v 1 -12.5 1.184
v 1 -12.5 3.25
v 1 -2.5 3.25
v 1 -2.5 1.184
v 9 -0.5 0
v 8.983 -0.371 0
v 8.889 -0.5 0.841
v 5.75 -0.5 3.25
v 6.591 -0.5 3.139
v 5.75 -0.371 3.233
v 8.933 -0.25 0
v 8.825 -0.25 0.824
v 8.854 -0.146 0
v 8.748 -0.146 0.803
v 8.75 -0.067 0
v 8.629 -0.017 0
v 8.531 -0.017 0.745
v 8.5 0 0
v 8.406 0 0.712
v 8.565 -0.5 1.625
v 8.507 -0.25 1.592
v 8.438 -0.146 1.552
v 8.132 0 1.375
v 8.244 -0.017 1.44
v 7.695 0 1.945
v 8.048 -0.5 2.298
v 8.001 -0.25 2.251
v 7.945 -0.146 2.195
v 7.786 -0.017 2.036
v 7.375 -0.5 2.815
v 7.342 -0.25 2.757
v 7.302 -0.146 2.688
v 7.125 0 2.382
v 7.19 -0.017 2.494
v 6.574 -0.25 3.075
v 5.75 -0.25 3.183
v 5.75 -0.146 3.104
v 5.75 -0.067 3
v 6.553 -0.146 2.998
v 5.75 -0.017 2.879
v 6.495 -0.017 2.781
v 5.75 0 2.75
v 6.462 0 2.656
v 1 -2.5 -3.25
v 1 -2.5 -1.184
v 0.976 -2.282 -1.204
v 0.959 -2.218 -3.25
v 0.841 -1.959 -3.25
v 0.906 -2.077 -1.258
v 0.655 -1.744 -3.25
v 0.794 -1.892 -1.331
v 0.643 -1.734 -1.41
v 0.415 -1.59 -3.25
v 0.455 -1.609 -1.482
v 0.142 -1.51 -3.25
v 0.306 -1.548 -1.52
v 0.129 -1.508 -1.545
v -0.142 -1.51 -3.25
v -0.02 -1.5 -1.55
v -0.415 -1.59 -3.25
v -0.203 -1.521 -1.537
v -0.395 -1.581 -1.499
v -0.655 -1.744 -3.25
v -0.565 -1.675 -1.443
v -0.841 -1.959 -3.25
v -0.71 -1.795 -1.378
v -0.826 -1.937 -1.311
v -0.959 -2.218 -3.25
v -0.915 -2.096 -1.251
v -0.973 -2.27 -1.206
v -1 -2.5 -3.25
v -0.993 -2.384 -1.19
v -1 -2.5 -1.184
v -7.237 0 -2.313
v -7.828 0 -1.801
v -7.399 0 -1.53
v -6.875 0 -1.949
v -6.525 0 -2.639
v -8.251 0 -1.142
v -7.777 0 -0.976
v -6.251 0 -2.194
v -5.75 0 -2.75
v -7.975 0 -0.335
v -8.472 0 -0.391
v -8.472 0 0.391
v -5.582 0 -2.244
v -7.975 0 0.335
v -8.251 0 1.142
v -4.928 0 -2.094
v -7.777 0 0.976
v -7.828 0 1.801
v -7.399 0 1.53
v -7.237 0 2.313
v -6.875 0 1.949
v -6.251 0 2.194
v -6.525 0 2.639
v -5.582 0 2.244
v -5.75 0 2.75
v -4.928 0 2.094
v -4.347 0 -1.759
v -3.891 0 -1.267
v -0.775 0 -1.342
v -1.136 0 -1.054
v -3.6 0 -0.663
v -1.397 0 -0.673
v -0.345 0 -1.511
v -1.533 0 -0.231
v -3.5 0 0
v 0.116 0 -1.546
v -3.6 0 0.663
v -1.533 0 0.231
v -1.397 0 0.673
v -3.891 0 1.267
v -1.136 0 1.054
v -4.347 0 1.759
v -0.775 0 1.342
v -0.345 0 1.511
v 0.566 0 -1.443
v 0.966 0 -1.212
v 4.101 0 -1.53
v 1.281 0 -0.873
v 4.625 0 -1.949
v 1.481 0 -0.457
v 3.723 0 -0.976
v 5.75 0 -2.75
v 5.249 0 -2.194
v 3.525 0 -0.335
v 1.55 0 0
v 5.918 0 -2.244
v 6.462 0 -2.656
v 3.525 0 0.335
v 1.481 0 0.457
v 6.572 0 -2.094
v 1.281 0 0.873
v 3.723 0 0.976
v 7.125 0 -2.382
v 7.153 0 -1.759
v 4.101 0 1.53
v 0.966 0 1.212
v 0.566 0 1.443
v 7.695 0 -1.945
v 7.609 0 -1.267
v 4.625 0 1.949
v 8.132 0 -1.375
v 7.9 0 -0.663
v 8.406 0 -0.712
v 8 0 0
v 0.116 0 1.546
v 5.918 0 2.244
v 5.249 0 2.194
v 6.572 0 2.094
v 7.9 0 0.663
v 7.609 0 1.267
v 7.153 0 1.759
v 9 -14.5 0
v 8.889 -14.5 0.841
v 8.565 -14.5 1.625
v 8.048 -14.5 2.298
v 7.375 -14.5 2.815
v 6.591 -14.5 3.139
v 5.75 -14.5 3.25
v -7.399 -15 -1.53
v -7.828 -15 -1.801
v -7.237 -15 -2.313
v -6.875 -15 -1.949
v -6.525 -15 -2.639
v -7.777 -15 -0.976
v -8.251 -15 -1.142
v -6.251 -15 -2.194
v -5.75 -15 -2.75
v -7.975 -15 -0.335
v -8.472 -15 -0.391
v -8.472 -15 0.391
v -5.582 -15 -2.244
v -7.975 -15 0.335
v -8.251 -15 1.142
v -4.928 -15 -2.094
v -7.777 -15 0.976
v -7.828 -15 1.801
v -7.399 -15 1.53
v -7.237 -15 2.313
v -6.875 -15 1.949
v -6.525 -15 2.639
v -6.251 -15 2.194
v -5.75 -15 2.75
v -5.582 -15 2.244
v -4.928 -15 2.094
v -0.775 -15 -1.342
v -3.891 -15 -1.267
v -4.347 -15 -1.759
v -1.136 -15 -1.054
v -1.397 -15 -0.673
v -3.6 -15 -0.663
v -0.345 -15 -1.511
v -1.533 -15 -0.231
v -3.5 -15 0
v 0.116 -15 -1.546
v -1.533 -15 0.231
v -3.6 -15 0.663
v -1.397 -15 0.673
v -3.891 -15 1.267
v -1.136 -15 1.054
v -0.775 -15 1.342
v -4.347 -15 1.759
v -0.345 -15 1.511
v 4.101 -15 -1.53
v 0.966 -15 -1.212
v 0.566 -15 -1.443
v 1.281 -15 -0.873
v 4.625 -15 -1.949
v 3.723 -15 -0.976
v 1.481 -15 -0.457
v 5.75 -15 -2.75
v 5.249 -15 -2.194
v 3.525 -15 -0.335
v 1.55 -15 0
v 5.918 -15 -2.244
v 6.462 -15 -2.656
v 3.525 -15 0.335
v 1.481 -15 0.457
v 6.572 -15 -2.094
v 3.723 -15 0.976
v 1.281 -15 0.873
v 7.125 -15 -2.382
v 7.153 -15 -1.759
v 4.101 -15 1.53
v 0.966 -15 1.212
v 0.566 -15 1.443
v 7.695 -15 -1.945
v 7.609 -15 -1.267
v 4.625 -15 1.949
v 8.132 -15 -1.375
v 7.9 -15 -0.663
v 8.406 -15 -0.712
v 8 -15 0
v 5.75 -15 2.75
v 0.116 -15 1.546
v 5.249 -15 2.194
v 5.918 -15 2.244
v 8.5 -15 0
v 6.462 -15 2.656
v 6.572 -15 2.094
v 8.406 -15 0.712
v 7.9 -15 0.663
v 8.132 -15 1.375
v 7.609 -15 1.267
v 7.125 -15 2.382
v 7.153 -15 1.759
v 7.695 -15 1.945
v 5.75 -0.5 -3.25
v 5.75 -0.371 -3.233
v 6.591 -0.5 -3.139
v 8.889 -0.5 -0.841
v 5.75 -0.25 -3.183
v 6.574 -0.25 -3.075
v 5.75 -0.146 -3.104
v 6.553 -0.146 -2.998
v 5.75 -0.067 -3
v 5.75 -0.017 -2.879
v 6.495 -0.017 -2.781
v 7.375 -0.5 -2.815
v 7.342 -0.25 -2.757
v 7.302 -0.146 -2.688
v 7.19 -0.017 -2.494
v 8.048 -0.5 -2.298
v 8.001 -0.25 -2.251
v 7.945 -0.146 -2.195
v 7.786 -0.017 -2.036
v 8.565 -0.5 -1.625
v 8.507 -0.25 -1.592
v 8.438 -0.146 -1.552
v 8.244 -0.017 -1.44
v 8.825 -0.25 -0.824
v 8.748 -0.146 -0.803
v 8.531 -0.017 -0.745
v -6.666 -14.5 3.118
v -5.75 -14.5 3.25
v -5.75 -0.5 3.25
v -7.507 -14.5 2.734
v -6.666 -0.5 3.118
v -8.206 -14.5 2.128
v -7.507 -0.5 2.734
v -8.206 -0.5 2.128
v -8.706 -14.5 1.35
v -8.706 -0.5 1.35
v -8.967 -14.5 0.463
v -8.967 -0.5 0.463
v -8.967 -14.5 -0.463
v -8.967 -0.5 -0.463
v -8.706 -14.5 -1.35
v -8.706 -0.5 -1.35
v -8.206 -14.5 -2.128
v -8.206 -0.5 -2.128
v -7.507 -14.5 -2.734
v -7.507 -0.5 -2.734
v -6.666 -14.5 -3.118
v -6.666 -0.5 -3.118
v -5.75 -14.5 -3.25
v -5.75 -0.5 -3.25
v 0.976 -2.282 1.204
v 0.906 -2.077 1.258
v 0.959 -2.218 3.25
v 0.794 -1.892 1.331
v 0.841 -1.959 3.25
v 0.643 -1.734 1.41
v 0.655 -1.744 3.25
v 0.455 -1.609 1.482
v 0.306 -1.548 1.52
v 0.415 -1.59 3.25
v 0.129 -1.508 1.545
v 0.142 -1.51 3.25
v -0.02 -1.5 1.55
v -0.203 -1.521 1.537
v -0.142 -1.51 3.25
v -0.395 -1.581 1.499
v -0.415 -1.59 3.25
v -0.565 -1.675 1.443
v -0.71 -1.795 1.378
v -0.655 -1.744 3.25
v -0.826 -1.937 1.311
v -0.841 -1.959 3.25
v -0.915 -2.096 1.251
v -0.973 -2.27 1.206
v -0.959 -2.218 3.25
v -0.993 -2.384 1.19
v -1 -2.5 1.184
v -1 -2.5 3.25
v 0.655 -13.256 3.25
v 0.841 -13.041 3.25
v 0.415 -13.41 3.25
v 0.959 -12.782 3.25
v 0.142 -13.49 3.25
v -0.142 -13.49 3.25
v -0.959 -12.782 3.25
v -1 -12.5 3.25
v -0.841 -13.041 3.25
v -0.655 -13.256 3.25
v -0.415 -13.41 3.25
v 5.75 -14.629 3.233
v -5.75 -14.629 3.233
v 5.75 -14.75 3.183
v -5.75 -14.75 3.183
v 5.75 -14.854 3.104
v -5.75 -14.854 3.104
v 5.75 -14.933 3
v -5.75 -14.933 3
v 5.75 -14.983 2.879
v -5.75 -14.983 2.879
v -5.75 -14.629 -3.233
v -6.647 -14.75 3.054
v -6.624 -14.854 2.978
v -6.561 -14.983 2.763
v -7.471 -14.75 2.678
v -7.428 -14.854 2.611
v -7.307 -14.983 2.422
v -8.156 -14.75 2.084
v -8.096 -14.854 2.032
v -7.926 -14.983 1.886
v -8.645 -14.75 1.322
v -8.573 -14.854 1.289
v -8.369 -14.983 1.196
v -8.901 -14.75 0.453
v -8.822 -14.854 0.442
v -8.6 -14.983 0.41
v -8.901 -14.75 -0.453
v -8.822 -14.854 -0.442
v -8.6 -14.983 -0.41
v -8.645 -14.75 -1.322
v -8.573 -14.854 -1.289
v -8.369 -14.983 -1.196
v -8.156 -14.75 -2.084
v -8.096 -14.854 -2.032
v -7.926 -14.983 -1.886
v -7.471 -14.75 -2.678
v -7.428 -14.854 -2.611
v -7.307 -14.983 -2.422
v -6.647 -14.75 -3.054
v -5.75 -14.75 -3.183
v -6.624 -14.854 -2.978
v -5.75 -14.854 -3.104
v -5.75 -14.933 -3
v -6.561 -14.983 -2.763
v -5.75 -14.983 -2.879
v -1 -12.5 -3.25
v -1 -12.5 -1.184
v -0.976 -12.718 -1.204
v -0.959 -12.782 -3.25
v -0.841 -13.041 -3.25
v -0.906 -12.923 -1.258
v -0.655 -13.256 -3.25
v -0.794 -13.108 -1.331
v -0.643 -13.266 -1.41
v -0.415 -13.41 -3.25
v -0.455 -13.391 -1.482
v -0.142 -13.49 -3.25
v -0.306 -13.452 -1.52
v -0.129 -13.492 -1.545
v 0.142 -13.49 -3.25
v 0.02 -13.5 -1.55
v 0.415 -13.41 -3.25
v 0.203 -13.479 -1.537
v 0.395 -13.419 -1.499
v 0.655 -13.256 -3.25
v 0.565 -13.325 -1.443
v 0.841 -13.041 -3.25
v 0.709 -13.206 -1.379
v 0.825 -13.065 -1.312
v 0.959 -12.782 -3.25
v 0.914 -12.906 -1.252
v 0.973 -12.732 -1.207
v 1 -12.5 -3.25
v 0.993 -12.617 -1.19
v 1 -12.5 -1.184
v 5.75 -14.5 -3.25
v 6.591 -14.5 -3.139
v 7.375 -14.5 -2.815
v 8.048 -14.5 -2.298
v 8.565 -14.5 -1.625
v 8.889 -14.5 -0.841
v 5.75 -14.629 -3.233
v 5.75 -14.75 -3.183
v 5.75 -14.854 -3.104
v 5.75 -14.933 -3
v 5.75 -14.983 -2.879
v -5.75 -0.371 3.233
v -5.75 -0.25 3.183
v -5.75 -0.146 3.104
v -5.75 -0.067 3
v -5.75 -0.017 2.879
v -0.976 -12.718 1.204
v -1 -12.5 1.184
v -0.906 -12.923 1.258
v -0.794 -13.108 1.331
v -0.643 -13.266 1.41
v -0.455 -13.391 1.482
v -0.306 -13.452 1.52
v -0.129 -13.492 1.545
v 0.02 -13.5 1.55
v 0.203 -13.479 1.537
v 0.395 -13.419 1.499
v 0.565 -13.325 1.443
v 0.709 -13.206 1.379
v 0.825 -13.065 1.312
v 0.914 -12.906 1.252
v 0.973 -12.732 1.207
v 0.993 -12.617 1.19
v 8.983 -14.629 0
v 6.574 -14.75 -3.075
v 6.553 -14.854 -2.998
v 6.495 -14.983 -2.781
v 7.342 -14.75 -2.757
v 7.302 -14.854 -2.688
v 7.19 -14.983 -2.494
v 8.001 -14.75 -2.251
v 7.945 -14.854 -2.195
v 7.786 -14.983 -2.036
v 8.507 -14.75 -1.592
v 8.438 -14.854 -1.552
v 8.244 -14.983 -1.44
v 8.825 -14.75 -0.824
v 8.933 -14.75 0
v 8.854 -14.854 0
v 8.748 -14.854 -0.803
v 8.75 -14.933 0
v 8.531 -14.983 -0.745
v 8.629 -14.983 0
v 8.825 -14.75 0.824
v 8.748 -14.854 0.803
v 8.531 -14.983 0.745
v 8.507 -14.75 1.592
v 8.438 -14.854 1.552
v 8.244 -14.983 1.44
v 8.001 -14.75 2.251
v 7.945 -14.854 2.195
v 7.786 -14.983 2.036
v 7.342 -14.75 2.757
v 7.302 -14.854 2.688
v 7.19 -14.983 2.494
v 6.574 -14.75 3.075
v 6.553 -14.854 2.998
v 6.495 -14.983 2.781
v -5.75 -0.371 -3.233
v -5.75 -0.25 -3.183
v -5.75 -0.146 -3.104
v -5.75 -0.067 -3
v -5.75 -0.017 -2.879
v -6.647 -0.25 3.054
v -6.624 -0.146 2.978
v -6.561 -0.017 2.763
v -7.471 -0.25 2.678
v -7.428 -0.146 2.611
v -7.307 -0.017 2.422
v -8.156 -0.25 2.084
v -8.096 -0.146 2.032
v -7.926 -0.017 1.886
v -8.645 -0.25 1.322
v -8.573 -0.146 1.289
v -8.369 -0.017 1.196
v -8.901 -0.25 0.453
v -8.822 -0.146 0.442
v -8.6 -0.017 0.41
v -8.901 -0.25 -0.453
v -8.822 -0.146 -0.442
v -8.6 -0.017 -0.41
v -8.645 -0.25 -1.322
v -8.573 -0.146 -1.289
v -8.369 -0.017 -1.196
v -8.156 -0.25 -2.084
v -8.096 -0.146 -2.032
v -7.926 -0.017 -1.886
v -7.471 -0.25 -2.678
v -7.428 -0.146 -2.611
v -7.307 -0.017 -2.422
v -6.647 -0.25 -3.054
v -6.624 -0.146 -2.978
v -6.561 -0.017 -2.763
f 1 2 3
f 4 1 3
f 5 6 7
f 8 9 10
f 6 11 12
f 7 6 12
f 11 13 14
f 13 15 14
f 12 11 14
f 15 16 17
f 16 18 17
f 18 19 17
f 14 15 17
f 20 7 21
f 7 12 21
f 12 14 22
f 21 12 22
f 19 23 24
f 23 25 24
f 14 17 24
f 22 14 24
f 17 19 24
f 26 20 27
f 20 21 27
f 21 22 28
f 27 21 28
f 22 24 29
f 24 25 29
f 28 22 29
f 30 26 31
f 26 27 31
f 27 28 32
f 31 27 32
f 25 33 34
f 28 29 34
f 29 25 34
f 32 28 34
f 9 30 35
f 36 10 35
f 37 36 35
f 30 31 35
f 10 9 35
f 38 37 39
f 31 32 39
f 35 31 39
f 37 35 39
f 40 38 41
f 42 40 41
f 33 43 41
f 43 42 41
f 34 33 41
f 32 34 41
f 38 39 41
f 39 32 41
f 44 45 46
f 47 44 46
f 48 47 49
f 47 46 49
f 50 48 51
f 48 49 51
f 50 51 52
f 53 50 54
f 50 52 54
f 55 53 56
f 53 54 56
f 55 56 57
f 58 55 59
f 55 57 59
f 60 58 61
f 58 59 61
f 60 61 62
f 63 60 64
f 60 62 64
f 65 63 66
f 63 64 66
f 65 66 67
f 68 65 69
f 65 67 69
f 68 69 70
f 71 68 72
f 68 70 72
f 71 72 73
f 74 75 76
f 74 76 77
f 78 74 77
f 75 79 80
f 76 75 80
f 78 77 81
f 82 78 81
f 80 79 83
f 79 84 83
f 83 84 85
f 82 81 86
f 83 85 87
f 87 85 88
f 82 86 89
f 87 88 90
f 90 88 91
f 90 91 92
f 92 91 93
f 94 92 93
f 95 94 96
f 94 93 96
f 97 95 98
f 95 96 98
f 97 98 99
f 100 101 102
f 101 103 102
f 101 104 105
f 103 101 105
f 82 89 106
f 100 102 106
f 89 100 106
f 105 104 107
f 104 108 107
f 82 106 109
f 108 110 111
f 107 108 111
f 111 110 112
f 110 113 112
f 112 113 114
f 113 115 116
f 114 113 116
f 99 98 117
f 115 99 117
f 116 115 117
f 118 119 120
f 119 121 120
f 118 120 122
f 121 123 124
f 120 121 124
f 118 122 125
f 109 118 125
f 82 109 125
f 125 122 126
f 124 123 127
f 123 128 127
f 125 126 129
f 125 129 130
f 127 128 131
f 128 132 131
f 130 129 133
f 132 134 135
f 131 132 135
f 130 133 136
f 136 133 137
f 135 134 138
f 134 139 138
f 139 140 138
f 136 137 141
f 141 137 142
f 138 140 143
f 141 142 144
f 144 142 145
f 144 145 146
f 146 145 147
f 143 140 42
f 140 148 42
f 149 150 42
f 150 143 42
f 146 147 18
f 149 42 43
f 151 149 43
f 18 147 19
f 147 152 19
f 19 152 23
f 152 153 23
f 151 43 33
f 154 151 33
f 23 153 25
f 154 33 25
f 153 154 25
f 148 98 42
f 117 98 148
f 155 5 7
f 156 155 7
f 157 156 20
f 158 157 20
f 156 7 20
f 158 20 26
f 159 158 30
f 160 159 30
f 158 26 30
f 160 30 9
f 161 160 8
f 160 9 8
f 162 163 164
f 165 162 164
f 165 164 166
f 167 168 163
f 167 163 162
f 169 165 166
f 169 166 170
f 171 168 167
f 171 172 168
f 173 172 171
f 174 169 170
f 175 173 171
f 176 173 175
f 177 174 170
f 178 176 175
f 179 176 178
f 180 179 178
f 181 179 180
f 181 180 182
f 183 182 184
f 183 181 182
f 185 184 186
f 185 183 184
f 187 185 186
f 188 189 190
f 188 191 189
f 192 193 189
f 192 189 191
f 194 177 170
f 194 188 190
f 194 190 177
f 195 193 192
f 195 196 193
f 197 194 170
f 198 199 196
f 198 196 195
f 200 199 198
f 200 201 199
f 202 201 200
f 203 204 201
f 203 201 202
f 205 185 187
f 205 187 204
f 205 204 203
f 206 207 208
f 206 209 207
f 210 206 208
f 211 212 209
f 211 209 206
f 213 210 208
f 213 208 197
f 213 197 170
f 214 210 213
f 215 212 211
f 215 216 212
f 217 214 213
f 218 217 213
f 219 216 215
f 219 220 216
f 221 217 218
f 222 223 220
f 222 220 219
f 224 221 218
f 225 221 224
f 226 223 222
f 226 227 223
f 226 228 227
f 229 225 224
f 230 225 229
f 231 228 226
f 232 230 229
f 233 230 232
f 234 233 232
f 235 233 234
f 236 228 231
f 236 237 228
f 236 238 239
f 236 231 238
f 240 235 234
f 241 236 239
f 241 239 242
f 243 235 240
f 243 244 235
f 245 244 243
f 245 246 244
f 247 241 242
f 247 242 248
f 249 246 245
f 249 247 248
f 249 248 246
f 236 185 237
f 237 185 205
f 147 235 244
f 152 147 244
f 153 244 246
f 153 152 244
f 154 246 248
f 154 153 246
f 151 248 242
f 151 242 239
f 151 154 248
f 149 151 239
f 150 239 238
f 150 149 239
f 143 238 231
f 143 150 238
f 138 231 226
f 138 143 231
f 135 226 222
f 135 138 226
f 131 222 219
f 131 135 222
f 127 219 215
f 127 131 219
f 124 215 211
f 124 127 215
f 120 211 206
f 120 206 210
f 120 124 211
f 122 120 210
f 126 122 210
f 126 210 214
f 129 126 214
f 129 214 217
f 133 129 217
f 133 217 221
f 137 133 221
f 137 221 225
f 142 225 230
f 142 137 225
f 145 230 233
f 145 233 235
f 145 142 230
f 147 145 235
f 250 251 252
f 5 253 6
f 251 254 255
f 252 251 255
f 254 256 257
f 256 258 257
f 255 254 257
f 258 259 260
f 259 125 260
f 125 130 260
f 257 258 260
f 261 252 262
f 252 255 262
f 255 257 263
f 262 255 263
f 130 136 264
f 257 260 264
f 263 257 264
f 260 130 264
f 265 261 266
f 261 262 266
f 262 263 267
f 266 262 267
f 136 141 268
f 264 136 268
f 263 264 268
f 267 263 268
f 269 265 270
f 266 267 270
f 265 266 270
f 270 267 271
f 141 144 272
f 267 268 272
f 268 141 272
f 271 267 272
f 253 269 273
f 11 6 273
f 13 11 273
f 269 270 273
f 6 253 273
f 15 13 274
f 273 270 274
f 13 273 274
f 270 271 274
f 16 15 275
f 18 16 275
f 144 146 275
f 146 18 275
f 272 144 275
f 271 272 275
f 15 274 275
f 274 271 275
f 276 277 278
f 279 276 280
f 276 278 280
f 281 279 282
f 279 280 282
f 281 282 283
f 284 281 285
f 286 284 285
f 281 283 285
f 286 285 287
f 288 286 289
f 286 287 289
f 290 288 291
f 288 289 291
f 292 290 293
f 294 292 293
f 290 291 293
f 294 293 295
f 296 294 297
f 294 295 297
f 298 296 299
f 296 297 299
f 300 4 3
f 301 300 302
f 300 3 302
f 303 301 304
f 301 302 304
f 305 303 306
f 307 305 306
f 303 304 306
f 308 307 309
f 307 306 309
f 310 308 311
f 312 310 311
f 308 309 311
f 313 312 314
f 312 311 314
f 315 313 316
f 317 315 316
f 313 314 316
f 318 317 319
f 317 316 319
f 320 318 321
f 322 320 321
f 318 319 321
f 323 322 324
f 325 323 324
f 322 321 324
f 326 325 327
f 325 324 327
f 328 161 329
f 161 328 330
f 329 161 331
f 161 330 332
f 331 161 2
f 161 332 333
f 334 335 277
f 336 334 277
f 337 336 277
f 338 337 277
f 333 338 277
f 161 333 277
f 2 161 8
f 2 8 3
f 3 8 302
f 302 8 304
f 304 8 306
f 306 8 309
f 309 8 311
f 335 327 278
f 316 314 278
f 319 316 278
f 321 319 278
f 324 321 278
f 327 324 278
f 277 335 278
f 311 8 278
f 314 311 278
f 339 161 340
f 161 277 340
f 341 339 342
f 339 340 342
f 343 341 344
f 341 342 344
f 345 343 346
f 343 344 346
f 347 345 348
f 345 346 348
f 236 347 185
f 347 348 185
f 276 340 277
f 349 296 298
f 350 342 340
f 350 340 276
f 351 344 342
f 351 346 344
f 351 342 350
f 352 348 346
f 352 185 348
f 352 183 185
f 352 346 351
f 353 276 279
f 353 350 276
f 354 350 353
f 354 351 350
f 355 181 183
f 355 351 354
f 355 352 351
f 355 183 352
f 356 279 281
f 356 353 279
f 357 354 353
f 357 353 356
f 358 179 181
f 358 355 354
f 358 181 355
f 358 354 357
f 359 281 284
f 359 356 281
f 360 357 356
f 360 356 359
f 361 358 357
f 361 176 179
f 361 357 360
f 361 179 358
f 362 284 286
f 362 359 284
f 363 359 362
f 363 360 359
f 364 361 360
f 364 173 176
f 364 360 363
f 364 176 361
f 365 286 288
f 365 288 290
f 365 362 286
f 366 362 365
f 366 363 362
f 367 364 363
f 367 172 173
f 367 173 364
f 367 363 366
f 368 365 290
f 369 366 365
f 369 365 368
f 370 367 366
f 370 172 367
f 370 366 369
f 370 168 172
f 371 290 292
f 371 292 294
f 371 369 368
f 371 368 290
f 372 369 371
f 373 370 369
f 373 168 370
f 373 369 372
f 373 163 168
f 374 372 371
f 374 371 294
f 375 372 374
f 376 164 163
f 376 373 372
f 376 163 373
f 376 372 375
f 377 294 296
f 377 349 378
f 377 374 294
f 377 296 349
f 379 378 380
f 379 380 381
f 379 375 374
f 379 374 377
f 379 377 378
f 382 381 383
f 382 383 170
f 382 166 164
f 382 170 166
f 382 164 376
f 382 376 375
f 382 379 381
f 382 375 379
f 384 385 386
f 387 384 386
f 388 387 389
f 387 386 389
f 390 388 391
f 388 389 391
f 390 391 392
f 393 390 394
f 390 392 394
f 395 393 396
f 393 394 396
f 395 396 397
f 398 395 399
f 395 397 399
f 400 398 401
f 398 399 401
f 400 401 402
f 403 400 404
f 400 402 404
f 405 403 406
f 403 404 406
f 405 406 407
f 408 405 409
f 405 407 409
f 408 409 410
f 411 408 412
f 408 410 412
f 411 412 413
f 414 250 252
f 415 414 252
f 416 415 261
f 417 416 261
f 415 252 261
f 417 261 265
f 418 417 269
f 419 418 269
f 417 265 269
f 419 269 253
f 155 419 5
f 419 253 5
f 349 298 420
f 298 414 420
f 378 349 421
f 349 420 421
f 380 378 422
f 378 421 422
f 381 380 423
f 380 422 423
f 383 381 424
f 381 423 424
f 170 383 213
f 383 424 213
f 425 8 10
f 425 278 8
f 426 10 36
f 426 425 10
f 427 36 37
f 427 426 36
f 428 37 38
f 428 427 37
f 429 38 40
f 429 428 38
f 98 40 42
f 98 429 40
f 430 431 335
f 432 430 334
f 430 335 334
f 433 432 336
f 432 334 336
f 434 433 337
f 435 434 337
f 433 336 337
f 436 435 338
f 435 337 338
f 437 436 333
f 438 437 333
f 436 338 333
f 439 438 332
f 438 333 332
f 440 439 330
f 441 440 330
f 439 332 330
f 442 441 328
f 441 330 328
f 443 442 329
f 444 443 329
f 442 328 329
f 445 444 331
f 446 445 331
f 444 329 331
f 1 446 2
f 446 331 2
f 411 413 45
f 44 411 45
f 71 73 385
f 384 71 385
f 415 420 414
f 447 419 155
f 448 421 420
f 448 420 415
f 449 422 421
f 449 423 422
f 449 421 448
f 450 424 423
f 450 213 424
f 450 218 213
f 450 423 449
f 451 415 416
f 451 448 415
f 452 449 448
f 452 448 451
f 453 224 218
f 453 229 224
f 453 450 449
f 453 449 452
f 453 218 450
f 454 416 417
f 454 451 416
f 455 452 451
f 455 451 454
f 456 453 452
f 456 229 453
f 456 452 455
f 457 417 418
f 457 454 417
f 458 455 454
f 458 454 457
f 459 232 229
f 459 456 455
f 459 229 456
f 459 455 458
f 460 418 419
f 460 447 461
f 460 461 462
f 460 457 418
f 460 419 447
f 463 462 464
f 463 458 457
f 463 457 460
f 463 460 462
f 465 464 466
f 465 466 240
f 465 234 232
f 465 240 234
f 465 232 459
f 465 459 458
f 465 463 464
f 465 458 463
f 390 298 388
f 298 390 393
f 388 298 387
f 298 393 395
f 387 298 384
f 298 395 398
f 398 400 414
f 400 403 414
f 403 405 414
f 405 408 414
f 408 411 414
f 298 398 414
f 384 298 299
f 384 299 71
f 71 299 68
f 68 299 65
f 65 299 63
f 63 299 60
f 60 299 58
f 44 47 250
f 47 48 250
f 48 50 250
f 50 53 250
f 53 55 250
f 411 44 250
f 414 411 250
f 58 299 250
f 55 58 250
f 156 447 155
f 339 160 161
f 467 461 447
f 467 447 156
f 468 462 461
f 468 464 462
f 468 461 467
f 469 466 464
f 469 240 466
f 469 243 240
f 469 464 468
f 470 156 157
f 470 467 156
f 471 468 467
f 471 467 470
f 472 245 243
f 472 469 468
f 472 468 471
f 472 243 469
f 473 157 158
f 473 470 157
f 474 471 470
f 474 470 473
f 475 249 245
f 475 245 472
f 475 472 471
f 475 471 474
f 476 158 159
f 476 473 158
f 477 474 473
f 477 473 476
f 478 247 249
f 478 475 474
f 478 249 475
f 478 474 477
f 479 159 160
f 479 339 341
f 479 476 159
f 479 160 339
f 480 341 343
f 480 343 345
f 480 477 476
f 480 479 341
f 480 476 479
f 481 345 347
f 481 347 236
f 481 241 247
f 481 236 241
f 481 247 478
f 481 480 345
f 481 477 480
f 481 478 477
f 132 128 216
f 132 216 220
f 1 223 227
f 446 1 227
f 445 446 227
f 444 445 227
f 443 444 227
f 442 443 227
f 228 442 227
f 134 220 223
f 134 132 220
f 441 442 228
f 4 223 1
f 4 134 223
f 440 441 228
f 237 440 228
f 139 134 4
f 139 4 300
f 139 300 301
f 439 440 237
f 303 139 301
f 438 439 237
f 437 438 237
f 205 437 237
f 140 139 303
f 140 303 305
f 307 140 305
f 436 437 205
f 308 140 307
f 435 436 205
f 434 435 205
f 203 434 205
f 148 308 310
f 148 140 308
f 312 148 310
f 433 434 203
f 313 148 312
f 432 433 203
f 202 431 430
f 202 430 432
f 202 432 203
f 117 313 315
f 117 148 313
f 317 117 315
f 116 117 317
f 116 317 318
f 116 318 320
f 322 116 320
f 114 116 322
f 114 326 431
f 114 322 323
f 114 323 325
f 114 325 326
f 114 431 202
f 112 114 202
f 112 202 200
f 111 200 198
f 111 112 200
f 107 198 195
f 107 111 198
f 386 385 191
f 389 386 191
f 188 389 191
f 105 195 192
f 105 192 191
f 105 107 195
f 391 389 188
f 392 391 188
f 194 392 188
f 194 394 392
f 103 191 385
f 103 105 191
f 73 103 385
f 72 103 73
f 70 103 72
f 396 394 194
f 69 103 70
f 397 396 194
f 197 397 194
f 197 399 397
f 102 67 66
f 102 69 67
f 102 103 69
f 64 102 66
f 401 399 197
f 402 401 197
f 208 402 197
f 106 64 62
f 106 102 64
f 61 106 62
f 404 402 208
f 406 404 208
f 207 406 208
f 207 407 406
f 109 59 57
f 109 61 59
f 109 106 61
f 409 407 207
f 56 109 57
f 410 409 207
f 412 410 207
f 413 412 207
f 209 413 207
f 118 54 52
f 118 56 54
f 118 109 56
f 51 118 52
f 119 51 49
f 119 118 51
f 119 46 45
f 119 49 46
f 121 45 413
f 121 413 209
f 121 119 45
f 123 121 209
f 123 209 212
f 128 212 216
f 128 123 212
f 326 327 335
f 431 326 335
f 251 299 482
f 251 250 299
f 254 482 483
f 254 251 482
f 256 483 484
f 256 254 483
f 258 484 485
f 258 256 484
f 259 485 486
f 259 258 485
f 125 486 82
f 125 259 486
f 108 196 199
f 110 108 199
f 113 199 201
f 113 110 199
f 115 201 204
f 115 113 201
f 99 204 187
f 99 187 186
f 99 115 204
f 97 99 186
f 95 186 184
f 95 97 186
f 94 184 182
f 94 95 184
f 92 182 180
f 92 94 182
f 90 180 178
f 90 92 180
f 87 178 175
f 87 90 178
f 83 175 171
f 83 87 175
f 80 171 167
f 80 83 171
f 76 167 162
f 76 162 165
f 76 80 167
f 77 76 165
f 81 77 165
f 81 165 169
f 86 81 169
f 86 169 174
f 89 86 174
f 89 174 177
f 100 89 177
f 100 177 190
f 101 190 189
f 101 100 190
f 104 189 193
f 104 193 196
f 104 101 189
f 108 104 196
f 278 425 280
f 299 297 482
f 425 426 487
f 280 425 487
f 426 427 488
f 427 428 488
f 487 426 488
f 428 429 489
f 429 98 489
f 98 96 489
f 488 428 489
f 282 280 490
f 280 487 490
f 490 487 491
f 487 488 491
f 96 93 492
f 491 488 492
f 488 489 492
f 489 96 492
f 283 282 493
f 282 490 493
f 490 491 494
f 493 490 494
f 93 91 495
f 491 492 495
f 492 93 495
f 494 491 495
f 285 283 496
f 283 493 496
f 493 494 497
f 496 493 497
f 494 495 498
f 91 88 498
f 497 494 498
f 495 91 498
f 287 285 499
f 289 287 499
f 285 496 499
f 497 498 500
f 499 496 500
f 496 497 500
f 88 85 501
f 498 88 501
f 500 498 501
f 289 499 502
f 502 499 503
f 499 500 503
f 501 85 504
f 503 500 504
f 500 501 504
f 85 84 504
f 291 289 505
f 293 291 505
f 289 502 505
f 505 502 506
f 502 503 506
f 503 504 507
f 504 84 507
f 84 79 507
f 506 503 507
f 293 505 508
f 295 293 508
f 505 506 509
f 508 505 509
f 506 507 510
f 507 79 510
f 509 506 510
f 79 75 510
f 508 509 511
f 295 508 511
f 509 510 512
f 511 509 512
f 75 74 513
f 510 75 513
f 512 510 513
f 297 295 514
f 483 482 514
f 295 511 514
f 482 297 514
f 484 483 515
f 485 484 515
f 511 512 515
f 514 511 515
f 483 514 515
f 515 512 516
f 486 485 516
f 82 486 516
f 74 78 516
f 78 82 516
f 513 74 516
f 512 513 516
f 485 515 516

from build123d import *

# Parameters (mm, degrees)
F0_R     = 2.25
F0_R_2   = 1.55
F1_DEPTH = 15
F3_DEPTH = 6.501
F4_R     = 0.5


with BuildPart() as f1:
    # F0 (on Front) → F1 (new body)
    with BuildSketch(Plane.XZ):
        with BuildLine():
            ThreePointArc((-5.75, -3.25), (-3.451903, -2.298097), (-2.5, 0))
            ThreePointArc((-2.5, 0), (-3.451903, 2.298097), (-5.75, 3.25))
            ThreePointArc((-5.75, 3.25), (-9, 0), (-5.75, -3.25))
        make_face()
        with Locations((-5.75, 0)):
            Circle(F0_R, mode=Mode.SUBTRACT)
        with BuildLine():
            ThreePointArc((9, 0), (8.048097, 2.298097), (5.75, 3.25))
            ThreePointArc((5.75, 3.25), (2.5, 0), (5.75, -3.25))
            ThreePointArc((5.75, -3.25), (8.048097, -2.298097), (9, 0))
        make_face()
        with Locations((5.75, 0)):
            Circle(F0_R, mode=Mode.SUBTRACT)
        with BuildLine():
            ThreePointArc((-5.75, 3.25), (-3.451903, 2.298097), (-2.5, 0))
            ThreePointArc((-2.5, 0), (-3.451903, -2.298097), (-5.75, -3.25))
            Line((-5.75, -3.25), (5.75, -3.25))
            ThreePointArc((5.75, -3.25), (2.5, 0), (5.75, 3.25))
            Line((5.75, 3.25), (-5.75, 3.25))
        make_face()
        Circle(F0_R_2, mode=Mode.SUBTRACT)
    extrude(amount=F1_DEPTH)

    # F2 (on face) → F3 (cut, through all)
    with BuildSketch(Plane.XY.offset(3.25)):
        with BuildLine():
            ThreePointArc((-1, -12.5), (0, -13.5), (1, -12.5))
            ThreePointArc((1, -12.5), (0, -11.5), (-1, -12.5))
        make_face()
        with BuildLine():
            ThreePointArc((-1, -12.5), (0, -11.5), (1, -12.5))
            Line((1, -12.5), (1, -7.5))
            Line((1, -7.5), (1, -2.5))
            ThreePointArc((1, -2.5), (0, -3.5), (-1, -2.5))
            Line((-1, -2.5), (-1, -7.5))
            Line((-1, -7.5), (-1, -12.5))
        make_face()
        with BuildLine():
            ThreePointArc((-1, -2.5), (0, -3.5), (1, -2.5))
            ThreePointArc((1, -2.5), (0, -1.5), (-1, -2.5))
        make_face()
    extrude(amount=-F3_DEPTH, mode=Mode.SUBTRACT)

    # F4
    f4_edges = [f1.edges().sort_by_distance(p)[0] for p in [
        (0, 0, 3.25),
        (0, -15, 3.25),
    ]]
    fillet(f4_edges, radius=F4_R)


solid = f1.part
